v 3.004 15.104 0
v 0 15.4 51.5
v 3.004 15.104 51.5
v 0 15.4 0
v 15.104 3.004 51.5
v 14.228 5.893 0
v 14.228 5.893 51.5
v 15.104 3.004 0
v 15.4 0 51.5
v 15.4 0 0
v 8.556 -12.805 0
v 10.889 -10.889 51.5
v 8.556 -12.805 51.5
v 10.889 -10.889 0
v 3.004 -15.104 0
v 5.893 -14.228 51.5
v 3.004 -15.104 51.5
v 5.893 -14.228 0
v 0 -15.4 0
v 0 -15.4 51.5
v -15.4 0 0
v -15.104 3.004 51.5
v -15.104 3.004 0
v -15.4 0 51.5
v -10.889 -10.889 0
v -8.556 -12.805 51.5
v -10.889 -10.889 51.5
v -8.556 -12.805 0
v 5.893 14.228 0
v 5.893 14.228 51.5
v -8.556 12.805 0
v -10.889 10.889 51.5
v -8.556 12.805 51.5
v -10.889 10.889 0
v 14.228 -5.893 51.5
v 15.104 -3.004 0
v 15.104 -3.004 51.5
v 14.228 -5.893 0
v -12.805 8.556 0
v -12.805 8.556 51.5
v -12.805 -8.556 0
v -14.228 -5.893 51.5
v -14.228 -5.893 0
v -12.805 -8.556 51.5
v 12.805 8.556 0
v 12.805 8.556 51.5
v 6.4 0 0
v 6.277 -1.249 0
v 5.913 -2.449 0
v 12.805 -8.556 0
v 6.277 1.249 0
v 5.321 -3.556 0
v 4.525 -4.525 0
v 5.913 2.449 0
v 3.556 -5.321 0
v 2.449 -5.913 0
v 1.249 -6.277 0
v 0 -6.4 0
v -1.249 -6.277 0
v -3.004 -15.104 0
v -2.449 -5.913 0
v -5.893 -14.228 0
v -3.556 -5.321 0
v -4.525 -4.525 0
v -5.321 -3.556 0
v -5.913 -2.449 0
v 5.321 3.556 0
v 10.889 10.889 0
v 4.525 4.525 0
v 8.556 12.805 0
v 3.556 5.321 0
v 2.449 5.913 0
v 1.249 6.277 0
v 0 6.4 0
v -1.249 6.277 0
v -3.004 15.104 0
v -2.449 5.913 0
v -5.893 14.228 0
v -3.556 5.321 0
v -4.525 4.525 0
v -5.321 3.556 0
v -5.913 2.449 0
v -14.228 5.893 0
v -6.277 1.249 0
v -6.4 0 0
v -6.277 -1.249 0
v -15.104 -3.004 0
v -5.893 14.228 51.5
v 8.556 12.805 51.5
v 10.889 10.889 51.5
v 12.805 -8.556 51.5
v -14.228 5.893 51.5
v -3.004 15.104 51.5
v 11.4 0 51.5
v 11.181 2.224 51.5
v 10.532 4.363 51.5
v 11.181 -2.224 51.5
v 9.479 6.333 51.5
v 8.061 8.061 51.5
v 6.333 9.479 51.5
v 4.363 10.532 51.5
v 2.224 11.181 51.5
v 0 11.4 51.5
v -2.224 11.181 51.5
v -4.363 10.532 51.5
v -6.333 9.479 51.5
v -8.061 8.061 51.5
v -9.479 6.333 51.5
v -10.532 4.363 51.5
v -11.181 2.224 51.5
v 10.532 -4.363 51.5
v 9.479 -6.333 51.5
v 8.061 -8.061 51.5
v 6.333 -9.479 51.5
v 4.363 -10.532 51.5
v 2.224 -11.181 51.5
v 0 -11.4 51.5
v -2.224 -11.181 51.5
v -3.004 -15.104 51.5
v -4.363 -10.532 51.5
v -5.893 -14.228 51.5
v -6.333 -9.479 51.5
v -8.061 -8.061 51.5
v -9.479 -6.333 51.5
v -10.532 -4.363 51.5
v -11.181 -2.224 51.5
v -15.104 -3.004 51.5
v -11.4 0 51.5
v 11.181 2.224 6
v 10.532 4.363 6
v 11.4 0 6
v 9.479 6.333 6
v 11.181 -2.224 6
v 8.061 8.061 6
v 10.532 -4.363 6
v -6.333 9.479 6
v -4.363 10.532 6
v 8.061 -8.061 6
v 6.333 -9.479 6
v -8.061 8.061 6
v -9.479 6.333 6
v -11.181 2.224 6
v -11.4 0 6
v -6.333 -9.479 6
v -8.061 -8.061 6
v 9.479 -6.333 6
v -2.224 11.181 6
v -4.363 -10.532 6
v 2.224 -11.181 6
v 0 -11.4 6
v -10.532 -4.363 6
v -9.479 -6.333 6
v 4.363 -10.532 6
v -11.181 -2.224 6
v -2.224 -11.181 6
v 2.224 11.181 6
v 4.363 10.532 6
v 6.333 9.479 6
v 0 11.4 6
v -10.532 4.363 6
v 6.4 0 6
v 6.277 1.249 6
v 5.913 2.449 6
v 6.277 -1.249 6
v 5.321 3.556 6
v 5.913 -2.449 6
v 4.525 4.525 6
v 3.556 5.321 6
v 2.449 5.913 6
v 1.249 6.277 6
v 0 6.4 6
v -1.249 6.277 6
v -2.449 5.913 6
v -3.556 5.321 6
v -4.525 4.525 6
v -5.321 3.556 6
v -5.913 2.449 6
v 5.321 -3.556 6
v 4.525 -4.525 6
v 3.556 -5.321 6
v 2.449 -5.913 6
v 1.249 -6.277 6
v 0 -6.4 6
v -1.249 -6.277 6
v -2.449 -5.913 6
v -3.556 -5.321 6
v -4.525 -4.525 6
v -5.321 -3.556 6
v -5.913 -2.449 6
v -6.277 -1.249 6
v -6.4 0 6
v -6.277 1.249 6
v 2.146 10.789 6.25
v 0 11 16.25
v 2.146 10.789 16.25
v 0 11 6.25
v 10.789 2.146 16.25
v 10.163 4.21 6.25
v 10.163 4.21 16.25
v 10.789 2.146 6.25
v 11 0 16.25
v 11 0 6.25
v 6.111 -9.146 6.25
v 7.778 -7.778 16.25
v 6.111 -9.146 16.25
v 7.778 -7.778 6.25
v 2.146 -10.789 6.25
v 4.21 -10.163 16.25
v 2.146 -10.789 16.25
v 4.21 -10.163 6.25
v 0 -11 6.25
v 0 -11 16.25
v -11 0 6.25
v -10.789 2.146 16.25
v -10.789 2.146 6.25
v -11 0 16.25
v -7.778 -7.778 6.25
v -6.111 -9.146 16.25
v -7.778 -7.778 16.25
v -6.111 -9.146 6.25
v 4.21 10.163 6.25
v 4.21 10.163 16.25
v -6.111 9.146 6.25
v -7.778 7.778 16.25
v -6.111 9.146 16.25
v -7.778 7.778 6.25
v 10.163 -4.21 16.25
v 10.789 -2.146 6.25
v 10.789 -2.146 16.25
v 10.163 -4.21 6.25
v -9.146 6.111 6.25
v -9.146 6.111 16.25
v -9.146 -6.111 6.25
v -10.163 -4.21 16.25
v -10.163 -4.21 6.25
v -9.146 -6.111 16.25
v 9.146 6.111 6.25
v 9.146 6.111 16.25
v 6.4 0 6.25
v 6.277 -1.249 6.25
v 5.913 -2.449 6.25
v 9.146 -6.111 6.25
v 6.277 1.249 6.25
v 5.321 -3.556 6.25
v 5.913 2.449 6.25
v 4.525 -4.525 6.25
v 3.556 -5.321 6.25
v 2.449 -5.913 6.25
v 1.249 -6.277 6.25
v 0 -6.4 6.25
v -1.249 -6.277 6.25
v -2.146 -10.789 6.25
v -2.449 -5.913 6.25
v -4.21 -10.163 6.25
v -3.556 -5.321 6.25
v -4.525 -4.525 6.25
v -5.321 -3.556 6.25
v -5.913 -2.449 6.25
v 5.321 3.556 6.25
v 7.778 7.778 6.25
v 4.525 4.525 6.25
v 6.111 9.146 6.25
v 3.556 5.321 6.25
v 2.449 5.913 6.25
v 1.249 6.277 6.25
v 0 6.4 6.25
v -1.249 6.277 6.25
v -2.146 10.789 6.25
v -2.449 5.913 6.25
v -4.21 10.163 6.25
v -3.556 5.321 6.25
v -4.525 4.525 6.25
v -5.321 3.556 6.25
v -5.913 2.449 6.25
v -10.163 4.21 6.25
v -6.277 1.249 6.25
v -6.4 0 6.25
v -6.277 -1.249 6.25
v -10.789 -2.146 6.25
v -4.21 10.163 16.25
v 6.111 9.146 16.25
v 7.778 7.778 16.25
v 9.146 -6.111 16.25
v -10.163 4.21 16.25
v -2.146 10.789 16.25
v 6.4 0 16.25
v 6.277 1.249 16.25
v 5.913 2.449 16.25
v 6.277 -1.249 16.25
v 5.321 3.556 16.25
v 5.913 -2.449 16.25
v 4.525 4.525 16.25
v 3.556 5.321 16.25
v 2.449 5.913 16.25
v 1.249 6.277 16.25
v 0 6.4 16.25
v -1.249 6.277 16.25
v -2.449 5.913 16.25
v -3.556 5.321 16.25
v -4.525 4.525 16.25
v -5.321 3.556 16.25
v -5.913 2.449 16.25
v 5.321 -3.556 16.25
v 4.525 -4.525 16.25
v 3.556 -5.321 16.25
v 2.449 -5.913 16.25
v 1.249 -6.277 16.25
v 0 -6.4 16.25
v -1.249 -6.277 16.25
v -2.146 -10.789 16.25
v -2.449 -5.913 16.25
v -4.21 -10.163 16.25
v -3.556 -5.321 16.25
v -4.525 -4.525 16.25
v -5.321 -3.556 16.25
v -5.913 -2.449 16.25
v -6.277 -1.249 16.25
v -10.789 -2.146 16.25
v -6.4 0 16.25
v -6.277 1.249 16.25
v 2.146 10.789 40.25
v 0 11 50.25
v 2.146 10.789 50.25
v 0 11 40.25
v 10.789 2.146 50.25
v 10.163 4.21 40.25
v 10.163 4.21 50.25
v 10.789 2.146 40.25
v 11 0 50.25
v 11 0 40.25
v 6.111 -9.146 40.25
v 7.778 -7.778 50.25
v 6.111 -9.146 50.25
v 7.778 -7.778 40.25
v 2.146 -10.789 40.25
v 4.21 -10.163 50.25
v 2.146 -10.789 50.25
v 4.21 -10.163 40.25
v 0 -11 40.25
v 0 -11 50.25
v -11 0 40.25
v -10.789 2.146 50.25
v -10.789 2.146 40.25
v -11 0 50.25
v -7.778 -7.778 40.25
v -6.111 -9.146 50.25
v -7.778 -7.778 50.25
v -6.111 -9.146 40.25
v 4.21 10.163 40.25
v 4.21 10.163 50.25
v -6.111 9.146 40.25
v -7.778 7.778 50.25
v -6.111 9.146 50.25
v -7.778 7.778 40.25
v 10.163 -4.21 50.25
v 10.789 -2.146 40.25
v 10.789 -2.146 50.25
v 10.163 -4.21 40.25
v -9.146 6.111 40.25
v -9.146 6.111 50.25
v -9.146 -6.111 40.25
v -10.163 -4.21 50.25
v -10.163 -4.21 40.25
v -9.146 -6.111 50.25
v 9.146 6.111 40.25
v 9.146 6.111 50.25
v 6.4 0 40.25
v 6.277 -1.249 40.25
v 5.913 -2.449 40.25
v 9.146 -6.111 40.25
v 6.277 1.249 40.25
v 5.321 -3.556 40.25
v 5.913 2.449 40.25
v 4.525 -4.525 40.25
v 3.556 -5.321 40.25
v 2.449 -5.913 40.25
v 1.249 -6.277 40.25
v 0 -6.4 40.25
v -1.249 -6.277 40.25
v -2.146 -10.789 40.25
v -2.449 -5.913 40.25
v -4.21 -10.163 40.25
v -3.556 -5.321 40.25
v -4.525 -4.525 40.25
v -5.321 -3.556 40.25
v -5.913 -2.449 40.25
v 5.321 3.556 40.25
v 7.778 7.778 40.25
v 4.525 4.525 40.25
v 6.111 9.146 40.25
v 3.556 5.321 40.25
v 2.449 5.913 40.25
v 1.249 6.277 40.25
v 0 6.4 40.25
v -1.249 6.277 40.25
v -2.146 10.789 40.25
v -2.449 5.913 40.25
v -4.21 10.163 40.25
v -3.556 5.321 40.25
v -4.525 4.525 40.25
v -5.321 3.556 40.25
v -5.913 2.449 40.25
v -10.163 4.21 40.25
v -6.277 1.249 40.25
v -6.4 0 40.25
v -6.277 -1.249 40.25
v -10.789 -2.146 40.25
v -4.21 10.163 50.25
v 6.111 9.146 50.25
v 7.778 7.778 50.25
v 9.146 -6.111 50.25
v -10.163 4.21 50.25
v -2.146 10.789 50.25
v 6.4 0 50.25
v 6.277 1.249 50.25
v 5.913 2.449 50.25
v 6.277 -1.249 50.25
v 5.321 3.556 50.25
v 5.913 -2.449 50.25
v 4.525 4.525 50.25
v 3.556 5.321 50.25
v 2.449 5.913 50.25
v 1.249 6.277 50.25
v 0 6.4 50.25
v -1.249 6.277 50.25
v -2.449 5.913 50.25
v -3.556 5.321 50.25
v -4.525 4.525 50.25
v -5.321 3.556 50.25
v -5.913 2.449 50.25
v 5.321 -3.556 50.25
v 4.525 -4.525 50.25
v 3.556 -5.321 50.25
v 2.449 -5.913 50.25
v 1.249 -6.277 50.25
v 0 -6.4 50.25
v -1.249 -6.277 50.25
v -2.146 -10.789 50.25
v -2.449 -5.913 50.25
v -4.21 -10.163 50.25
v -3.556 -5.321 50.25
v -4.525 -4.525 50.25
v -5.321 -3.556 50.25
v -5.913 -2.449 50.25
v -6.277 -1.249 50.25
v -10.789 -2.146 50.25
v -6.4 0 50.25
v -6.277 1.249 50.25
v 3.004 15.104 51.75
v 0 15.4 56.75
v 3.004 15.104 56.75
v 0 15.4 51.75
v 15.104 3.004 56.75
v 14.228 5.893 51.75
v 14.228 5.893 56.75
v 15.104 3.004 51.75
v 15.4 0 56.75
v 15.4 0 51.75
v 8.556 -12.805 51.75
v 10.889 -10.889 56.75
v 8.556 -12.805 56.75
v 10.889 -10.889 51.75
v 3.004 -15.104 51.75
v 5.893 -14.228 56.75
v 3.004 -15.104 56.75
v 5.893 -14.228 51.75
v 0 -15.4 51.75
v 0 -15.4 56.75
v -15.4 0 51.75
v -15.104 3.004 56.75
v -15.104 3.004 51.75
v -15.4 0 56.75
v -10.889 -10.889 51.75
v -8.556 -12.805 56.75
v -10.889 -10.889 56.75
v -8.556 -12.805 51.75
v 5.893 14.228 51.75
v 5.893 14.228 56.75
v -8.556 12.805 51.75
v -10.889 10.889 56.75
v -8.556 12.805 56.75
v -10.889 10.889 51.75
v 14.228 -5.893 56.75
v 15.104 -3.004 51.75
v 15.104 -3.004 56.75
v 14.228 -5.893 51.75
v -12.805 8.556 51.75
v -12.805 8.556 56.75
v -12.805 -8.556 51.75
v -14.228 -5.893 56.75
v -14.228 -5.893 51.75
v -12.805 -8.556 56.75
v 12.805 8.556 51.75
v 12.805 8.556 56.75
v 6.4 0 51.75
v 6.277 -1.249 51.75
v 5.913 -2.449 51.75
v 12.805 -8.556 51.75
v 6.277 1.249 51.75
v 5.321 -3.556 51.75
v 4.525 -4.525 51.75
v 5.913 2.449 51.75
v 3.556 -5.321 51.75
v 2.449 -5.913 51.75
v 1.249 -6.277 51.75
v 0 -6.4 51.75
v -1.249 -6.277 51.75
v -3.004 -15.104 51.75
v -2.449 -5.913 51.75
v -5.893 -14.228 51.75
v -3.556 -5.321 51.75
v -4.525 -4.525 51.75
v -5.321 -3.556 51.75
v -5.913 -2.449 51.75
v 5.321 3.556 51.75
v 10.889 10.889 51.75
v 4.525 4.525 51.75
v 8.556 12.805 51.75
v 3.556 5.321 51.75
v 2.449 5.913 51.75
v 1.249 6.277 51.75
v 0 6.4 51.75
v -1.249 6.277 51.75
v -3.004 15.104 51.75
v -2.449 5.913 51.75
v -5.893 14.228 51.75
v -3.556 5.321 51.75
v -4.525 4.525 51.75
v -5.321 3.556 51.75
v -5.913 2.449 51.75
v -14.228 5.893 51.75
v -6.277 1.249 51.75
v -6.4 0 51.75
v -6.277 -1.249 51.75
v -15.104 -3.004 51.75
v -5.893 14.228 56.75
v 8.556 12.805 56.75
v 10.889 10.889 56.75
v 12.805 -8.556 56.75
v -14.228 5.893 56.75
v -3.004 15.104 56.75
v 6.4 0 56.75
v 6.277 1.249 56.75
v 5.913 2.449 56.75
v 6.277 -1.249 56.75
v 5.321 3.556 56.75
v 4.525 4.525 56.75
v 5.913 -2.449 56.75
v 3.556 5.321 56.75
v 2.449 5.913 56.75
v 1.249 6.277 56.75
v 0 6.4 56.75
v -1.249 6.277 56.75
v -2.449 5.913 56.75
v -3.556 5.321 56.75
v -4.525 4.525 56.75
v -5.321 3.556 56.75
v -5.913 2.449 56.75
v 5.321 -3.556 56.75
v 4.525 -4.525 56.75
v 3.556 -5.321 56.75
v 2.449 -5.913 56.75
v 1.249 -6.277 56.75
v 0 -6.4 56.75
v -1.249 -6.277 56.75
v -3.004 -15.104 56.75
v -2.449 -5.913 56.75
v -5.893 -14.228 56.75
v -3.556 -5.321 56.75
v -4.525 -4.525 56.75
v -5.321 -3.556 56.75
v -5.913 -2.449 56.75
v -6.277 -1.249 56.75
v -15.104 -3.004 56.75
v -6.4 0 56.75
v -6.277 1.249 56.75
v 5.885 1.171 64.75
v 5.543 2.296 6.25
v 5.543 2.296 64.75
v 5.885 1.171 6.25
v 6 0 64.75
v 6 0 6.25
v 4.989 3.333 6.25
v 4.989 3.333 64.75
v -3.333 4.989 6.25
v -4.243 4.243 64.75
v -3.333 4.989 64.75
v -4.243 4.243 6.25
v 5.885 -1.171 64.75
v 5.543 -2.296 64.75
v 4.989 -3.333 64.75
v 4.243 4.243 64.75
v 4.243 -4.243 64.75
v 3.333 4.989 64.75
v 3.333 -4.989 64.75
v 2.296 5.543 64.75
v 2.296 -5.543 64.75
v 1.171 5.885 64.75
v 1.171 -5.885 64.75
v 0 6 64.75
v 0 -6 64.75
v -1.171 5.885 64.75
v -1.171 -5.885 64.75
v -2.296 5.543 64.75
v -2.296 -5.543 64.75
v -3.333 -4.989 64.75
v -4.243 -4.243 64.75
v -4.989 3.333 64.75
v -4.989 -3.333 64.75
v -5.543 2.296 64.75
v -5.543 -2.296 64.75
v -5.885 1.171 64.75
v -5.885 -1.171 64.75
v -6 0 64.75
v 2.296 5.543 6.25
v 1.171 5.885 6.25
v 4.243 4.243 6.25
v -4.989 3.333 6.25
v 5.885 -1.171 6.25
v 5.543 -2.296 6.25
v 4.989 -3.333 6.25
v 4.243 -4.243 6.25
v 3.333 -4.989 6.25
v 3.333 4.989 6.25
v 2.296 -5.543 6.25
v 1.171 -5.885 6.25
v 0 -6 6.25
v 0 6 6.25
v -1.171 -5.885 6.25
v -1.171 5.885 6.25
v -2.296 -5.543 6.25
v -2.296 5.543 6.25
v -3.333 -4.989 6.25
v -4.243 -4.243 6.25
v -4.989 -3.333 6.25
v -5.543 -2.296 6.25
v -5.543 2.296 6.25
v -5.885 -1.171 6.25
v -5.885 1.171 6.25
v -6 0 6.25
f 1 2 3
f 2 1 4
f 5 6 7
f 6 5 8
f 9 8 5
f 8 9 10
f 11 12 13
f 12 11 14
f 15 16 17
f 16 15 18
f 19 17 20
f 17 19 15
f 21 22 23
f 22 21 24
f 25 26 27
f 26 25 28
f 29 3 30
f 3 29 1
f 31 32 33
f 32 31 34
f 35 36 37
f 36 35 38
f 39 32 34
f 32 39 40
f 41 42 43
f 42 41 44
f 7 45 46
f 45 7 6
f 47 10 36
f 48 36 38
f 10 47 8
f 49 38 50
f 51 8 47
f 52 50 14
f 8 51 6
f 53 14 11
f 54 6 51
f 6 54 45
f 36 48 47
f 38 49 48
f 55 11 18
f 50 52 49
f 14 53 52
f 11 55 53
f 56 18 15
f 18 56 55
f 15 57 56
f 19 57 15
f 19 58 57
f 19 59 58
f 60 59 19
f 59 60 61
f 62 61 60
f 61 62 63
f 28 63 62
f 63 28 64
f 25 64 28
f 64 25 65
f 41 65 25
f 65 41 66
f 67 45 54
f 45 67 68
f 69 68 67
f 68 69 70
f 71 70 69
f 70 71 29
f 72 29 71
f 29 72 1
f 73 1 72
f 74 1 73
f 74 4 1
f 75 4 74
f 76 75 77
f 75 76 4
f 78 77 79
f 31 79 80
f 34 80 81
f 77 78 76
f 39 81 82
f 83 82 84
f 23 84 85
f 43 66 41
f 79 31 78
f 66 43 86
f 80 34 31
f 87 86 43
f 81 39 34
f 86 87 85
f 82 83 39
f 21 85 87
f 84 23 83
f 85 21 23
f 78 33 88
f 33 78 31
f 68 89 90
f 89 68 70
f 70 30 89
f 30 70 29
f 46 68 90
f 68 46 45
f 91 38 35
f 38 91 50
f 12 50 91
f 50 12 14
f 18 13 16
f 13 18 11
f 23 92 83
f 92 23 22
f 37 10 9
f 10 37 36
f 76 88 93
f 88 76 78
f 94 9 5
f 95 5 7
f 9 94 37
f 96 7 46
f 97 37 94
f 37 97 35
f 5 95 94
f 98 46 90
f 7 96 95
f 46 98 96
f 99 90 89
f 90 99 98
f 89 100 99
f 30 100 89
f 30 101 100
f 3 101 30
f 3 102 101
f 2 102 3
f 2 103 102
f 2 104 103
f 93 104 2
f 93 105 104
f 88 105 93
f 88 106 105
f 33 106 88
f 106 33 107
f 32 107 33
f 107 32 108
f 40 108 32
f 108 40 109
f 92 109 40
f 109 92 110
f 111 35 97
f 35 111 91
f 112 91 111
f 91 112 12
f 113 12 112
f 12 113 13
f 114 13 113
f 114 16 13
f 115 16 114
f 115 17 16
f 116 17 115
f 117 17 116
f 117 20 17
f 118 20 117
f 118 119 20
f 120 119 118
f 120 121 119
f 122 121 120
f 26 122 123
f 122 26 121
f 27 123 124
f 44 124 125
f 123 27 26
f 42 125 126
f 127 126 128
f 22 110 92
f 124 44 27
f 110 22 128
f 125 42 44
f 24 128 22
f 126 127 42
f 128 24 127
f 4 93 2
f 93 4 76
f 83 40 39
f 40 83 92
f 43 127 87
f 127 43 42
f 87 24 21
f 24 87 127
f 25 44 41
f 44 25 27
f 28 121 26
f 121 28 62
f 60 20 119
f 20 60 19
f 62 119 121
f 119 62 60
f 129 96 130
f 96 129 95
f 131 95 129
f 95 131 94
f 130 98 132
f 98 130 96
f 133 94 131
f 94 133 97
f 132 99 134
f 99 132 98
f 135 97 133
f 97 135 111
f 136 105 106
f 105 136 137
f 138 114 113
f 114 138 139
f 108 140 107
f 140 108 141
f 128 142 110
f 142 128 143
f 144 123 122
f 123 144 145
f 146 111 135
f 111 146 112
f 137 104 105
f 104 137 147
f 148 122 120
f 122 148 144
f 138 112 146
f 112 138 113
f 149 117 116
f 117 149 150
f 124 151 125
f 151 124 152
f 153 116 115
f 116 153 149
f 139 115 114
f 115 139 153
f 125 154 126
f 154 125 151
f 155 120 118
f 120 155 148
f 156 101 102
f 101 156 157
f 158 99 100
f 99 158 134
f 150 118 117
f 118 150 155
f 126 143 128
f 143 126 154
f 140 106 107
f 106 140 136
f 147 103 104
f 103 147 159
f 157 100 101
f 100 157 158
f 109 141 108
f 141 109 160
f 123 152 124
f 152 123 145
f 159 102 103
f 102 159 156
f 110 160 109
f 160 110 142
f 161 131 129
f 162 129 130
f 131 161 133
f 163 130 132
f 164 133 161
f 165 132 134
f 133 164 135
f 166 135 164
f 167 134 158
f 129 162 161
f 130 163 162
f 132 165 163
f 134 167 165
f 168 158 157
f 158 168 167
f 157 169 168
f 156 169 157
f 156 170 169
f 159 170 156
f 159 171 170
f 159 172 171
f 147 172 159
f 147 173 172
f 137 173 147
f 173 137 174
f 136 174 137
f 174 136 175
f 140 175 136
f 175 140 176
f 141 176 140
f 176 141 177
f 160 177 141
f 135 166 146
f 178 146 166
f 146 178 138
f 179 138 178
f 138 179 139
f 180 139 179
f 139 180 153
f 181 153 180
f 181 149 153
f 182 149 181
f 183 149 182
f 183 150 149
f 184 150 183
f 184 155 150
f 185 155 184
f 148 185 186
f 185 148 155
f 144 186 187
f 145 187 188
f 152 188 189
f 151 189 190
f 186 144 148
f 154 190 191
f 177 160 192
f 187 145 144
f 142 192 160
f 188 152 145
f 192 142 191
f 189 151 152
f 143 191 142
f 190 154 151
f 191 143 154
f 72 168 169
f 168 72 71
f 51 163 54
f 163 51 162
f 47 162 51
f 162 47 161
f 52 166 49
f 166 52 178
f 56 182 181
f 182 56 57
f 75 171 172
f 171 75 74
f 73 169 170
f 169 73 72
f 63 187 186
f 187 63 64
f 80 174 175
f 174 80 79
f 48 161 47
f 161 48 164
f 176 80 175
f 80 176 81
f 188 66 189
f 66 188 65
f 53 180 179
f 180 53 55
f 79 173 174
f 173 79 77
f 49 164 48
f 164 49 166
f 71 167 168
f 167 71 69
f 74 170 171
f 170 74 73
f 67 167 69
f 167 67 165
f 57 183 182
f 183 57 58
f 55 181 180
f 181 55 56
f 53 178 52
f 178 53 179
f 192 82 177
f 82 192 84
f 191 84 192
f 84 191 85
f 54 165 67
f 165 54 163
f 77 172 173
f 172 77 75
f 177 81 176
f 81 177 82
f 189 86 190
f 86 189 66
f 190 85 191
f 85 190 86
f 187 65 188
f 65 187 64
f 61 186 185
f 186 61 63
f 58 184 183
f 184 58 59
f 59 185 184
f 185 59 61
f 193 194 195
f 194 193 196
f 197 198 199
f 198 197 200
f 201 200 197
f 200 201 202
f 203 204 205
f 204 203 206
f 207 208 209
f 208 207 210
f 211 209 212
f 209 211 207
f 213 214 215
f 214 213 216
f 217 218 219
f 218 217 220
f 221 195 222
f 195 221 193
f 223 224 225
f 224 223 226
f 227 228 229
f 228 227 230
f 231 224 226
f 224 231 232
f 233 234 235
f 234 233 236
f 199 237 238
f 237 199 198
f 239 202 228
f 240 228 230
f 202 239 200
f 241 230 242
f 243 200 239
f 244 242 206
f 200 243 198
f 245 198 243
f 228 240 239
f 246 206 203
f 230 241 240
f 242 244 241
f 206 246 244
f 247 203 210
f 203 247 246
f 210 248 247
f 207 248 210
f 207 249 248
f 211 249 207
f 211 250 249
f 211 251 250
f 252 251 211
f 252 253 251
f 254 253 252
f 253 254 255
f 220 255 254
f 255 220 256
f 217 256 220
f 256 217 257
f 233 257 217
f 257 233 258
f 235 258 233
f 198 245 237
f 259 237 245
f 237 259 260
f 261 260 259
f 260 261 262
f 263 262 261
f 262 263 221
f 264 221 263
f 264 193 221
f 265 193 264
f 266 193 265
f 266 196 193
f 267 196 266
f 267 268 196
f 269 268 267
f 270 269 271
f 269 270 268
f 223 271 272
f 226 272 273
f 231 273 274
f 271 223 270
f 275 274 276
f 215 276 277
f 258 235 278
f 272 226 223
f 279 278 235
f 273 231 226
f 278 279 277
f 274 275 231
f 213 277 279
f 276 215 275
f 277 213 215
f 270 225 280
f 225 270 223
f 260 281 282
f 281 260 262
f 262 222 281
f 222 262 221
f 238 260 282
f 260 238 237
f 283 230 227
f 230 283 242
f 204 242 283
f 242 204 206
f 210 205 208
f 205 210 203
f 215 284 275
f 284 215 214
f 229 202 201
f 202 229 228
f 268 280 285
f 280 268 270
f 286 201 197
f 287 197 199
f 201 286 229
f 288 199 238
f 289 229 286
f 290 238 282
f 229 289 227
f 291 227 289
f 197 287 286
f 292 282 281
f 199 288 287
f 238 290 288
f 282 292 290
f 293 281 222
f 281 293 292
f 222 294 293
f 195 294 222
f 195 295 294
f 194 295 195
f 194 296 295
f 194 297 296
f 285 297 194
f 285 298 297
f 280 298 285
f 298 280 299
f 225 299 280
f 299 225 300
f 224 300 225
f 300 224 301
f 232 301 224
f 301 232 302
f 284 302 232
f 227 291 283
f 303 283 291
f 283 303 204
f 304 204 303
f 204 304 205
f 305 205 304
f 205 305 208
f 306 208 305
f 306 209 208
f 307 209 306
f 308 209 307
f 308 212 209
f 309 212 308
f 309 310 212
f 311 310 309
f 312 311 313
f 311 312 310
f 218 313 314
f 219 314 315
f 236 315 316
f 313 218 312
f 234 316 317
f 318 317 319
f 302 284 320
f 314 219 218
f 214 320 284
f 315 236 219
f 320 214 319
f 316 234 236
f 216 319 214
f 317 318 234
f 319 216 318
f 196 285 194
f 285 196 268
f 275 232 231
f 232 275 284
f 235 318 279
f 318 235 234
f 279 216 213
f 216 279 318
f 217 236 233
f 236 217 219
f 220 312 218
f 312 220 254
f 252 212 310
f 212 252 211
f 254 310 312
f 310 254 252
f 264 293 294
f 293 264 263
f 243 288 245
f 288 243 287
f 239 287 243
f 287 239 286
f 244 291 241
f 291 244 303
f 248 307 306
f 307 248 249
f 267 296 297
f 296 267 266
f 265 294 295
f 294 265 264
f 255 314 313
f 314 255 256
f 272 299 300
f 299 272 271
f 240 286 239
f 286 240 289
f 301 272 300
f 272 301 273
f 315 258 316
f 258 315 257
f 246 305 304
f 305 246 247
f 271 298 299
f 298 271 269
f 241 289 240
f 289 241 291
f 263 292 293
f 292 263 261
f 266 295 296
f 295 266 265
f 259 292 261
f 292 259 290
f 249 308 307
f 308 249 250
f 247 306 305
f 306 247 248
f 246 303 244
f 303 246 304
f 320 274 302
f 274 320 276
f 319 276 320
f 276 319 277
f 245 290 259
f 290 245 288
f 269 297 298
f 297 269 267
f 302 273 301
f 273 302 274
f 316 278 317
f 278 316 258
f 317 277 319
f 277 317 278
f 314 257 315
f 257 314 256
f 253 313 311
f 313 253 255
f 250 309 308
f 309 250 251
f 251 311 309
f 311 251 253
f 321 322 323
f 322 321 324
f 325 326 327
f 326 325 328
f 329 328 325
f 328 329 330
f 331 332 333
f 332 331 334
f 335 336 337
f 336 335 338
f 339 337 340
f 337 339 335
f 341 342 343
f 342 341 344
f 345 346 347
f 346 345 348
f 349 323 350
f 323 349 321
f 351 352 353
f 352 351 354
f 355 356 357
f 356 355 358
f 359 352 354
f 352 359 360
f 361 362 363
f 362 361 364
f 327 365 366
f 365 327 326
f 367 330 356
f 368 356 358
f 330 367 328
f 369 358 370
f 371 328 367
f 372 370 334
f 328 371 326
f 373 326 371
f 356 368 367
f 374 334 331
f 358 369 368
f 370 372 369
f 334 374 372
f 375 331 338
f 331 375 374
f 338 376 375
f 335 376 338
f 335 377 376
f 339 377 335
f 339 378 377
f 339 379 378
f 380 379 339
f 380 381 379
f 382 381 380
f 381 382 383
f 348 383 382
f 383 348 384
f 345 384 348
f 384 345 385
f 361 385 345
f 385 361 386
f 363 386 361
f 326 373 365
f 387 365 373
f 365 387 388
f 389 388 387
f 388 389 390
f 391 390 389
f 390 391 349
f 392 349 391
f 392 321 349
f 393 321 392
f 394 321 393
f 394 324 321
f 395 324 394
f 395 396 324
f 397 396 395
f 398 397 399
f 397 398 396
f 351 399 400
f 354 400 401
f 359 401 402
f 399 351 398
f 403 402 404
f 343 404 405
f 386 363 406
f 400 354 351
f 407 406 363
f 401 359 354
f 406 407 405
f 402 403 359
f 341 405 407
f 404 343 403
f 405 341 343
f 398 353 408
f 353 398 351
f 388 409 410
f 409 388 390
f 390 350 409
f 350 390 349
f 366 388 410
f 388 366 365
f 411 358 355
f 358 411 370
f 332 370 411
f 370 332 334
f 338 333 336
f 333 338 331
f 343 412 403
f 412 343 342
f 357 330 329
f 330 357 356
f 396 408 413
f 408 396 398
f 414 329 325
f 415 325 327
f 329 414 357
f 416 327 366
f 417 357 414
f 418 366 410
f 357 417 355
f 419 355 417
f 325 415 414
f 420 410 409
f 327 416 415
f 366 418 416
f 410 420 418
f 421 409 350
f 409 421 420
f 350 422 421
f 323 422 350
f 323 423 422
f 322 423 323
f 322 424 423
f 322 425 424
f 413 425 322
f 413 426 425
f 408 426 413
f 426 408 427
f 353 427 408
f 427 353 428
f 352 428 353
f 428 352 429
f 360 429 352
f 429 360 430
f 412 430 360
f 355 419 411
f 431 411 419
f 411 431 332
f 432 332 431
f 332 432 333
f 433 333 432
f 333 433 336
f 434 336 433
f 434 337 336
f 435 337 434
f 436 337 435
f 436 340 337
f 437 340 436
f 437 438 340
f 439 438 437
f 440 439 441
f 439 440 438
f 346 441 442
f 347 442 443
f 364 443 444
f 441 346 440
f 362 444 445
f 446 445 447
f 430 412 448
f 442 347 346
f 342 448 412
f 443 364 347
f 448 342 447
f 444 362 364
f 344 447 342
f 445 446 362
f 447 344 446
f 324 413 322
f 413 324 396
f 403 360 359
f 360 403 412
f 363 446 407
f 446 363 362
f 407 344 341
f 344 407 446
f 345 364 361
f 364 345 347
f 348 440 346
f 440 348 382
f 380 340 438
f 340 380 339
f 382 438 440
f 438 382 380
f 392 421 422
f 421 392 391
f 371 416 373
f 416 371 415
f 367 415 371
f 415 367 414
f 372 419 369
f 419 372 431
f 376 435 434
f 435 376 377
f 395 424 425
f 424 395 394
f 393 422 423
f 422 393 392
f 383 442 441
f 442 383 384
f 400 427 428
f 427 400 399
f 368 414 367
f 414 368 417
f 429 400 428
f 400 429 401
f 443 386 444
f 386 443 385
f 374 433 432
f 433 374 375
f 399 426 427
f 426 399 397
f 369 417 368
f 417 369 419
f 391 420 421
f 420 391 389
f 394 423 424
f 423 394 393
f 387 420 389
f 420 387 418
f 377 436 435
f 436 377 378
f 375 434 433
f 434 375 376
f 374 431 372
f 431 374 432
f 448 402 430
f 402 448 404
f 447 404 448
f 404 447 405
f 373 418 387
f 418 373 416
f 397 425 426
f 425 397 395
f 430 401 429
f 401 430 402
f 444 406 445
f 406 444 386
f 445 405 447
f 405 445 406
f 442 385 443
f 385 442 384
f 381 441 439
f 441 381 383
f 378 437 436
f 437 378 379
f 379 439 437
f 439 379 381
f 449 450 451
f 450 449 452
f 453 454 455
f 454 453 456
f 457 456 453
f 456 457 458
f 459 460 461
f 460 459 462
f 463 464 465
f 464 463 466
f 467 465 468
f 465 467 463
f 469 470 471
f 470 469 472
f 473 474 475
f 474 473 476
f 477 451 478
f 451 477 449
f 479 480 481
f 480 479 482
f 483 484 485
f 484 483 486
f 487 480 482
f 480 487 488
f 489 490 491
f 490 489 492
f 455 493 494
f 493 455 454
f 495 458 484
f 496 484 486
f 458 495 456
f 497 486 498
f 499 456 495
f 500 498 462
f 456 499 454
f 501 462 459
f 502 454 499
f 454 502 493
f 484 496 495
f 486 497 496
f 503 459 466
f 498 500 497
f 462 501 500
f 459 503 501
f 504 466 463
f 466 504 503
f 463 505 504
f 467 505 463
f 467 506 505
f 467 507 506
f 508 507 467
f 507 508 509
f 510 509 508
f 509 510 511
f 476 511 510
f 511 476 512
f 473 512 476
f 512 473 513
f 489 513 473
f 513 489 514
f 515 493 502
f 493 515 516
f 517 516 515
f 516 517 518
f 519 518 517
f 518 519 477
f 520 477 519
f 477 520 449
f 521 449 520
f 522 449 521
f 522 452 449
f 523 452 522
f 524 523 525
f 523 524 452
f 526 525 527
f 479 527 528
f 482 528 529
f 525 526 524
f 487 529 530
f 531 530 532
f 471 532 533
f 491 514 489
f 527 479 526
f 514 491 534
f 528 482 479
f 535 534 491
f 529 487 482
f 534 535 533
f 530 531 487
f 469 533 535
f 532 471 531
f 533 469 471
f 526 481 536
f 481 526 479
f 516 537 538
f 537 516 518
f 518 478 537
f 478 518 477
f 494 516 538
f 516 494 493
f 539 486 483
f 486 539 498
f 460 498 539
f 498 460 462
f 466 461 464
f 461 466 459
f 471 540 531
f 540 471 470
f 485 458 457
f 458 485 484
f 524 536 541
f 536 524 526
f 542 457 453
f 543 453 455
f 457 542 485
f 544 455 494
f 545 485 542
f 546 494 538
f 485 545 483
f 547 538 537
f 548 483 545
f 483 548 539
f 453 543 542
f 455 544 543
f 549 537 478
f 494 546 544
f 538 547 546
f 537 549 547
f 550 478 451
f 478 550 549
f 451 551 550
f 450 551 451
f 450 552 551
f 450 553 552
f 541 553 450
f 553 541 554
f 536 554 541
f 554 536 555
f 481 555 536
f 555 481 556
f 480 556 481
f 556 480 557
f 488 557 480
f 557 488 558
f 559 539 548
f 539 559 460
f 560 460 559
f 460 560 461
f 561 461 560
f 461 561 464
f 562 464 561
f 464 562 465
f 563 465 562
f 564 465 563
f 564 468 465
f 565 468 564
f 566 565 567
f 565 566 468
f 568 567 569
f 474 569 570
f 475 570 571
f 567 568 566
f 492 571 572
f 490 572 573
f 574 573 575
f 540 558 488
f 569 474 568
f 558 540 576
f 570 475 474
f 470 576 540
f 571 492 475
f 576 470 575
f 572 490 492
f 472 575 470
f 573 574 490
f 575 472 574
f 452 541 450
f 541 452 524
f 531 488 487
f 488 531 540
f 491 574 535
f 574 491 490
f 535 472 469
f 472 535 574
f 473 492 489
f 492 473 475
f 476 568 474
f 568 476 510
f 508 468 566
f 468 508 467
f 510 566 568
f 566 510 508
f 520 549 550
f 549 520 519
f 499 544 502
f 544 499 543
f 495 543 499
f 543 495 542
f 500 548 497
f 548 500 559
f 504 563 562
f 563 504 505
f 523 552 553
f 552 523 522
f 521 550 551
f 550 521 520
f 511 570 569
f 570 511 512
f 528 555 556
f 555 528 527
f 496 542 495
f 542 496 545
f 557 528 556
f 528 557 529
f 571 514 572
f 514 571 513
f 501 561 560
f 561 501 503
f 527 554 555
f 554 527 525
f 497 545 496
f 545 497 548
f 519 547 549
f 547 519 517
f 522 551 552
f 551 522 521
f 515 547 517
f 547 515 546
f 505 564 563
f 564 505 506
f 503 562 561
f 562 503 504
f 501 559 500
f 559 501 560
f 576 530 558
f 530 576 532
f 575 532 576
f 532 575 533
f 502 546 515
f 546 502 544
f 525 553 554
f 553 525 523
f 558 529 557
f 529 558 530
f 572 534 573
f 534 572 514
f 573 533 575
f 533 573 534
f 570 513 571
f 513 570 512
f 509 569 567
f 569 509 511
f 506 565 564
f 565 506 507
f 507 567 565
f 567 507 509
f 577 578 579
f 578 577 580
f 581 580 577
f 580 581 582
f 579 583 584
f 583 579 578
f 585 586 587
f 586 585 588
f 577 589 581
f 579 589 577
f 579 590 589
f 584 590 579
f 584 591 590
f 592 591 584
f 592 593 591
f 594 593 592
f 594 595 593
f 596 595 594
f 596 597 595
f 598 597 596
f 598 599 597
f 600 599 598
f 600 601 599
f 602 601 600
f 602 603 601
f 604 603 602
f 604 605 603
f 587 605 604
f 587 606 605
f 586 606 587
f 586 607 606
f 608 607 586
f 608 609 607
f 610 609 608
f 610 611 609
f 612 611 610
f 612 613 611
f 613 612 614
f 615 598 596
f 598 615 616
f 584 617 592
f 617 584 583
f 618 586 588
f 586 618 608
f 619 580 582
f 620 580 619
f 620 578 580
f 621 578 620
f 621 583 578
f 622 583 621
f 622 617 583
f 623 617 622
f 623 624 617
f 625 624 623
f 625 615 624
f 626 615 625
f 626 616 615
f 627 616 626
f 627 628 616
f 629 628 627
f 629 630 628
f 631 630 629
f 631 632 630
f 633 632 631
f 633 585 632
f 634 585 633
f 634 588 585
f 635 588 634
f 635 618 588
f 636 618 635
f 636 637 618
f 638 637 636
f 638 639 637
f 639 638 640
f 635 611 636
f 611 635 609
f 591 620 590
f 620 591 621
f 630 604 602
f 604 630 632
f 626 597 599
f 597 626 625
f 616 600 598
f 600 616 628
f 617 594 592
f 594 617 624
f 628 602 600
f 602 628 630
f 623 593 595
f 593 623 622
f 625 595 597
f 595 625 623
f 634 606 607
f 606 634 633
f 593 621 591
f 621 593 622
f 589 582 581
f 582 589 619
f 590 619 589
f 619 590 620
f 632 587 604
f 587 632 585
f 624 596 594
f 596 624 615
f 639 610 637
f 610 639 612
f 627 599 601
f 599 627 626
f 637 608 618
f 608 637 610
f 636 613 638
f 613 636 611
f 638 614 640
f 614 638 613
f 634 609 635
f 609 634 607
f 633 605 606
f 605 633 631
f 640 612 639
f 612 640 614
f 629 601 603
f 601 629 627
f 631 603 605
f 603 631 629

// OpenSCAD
$fn = 32;

// ------------------------------------------------------------------------
// Shaft station: cup d30.8 x 51.5 mm, shaft d12
// Every part is its own module, assembly() places every instance.
// ------------------------------------------------------------------------

// --- part 1 ---
module housing_cup() {
  difference() {
    cylinder(h = 51.5, d = 30.8);
    translate([0, 0, 6]) cylinder(h = 46.5, d = 22.8);
    translate([0, 0, -1]) cylinder(h = 8, d = 12.8);
  }
}

// --- part 2 ---
module bearing_lower() {
  difference() {
      translate([0, 0, 0]) cylinder(h = 10, d = 22);
      translate([0, 0, -1]) cylinder(h = 12, d = 12.8);
    }
}

// --- part 3 ---
module bearing_upper() {
  difference() {
      translate([0, 0, 0]) cylinder(h = 10, d = 22);
      translate([0, 0, -1]) cylinder(h = 12, d = 12.8);
    }
}

// --- part 4 ---
module station_shaft() {
  translate([0, 0, -29.25]) cylinder(h = 58.5, d = 12);
}

// --- part 5 ---
module station_cover() {
  difference() {
    cylinder(h = 5, d = 30.8);
    translate([0, 0, -1]) cylinder(h = 7, d = 12.8);
  }
}

// --- assembly ---
module assembly() {
  color([0.80, 0.24, 0.20]) translate([0, 0, 0]) rotate([0, 0, 0]) housing_cup();
  color([0.20, 0.45, 0.75]) translate([0, 0, 6.25]) rotate([0, 0, 0]) bearing_lower();
  color([0.25, 0.62, 0.32]) translate([0, 0, 40.25]) rotate([0, 0, 0]) bearing_upper();
  color([0.92, 0.70, 0.18]) translate([0, 0, 35.5]) rotate([0, 0, 0]) station_shaft();
  color([0.58, 0.35, 0.70]) translate([0, 0, 51.75]) rotate([0, 0, 0]) station_cover();
}

assembly();
